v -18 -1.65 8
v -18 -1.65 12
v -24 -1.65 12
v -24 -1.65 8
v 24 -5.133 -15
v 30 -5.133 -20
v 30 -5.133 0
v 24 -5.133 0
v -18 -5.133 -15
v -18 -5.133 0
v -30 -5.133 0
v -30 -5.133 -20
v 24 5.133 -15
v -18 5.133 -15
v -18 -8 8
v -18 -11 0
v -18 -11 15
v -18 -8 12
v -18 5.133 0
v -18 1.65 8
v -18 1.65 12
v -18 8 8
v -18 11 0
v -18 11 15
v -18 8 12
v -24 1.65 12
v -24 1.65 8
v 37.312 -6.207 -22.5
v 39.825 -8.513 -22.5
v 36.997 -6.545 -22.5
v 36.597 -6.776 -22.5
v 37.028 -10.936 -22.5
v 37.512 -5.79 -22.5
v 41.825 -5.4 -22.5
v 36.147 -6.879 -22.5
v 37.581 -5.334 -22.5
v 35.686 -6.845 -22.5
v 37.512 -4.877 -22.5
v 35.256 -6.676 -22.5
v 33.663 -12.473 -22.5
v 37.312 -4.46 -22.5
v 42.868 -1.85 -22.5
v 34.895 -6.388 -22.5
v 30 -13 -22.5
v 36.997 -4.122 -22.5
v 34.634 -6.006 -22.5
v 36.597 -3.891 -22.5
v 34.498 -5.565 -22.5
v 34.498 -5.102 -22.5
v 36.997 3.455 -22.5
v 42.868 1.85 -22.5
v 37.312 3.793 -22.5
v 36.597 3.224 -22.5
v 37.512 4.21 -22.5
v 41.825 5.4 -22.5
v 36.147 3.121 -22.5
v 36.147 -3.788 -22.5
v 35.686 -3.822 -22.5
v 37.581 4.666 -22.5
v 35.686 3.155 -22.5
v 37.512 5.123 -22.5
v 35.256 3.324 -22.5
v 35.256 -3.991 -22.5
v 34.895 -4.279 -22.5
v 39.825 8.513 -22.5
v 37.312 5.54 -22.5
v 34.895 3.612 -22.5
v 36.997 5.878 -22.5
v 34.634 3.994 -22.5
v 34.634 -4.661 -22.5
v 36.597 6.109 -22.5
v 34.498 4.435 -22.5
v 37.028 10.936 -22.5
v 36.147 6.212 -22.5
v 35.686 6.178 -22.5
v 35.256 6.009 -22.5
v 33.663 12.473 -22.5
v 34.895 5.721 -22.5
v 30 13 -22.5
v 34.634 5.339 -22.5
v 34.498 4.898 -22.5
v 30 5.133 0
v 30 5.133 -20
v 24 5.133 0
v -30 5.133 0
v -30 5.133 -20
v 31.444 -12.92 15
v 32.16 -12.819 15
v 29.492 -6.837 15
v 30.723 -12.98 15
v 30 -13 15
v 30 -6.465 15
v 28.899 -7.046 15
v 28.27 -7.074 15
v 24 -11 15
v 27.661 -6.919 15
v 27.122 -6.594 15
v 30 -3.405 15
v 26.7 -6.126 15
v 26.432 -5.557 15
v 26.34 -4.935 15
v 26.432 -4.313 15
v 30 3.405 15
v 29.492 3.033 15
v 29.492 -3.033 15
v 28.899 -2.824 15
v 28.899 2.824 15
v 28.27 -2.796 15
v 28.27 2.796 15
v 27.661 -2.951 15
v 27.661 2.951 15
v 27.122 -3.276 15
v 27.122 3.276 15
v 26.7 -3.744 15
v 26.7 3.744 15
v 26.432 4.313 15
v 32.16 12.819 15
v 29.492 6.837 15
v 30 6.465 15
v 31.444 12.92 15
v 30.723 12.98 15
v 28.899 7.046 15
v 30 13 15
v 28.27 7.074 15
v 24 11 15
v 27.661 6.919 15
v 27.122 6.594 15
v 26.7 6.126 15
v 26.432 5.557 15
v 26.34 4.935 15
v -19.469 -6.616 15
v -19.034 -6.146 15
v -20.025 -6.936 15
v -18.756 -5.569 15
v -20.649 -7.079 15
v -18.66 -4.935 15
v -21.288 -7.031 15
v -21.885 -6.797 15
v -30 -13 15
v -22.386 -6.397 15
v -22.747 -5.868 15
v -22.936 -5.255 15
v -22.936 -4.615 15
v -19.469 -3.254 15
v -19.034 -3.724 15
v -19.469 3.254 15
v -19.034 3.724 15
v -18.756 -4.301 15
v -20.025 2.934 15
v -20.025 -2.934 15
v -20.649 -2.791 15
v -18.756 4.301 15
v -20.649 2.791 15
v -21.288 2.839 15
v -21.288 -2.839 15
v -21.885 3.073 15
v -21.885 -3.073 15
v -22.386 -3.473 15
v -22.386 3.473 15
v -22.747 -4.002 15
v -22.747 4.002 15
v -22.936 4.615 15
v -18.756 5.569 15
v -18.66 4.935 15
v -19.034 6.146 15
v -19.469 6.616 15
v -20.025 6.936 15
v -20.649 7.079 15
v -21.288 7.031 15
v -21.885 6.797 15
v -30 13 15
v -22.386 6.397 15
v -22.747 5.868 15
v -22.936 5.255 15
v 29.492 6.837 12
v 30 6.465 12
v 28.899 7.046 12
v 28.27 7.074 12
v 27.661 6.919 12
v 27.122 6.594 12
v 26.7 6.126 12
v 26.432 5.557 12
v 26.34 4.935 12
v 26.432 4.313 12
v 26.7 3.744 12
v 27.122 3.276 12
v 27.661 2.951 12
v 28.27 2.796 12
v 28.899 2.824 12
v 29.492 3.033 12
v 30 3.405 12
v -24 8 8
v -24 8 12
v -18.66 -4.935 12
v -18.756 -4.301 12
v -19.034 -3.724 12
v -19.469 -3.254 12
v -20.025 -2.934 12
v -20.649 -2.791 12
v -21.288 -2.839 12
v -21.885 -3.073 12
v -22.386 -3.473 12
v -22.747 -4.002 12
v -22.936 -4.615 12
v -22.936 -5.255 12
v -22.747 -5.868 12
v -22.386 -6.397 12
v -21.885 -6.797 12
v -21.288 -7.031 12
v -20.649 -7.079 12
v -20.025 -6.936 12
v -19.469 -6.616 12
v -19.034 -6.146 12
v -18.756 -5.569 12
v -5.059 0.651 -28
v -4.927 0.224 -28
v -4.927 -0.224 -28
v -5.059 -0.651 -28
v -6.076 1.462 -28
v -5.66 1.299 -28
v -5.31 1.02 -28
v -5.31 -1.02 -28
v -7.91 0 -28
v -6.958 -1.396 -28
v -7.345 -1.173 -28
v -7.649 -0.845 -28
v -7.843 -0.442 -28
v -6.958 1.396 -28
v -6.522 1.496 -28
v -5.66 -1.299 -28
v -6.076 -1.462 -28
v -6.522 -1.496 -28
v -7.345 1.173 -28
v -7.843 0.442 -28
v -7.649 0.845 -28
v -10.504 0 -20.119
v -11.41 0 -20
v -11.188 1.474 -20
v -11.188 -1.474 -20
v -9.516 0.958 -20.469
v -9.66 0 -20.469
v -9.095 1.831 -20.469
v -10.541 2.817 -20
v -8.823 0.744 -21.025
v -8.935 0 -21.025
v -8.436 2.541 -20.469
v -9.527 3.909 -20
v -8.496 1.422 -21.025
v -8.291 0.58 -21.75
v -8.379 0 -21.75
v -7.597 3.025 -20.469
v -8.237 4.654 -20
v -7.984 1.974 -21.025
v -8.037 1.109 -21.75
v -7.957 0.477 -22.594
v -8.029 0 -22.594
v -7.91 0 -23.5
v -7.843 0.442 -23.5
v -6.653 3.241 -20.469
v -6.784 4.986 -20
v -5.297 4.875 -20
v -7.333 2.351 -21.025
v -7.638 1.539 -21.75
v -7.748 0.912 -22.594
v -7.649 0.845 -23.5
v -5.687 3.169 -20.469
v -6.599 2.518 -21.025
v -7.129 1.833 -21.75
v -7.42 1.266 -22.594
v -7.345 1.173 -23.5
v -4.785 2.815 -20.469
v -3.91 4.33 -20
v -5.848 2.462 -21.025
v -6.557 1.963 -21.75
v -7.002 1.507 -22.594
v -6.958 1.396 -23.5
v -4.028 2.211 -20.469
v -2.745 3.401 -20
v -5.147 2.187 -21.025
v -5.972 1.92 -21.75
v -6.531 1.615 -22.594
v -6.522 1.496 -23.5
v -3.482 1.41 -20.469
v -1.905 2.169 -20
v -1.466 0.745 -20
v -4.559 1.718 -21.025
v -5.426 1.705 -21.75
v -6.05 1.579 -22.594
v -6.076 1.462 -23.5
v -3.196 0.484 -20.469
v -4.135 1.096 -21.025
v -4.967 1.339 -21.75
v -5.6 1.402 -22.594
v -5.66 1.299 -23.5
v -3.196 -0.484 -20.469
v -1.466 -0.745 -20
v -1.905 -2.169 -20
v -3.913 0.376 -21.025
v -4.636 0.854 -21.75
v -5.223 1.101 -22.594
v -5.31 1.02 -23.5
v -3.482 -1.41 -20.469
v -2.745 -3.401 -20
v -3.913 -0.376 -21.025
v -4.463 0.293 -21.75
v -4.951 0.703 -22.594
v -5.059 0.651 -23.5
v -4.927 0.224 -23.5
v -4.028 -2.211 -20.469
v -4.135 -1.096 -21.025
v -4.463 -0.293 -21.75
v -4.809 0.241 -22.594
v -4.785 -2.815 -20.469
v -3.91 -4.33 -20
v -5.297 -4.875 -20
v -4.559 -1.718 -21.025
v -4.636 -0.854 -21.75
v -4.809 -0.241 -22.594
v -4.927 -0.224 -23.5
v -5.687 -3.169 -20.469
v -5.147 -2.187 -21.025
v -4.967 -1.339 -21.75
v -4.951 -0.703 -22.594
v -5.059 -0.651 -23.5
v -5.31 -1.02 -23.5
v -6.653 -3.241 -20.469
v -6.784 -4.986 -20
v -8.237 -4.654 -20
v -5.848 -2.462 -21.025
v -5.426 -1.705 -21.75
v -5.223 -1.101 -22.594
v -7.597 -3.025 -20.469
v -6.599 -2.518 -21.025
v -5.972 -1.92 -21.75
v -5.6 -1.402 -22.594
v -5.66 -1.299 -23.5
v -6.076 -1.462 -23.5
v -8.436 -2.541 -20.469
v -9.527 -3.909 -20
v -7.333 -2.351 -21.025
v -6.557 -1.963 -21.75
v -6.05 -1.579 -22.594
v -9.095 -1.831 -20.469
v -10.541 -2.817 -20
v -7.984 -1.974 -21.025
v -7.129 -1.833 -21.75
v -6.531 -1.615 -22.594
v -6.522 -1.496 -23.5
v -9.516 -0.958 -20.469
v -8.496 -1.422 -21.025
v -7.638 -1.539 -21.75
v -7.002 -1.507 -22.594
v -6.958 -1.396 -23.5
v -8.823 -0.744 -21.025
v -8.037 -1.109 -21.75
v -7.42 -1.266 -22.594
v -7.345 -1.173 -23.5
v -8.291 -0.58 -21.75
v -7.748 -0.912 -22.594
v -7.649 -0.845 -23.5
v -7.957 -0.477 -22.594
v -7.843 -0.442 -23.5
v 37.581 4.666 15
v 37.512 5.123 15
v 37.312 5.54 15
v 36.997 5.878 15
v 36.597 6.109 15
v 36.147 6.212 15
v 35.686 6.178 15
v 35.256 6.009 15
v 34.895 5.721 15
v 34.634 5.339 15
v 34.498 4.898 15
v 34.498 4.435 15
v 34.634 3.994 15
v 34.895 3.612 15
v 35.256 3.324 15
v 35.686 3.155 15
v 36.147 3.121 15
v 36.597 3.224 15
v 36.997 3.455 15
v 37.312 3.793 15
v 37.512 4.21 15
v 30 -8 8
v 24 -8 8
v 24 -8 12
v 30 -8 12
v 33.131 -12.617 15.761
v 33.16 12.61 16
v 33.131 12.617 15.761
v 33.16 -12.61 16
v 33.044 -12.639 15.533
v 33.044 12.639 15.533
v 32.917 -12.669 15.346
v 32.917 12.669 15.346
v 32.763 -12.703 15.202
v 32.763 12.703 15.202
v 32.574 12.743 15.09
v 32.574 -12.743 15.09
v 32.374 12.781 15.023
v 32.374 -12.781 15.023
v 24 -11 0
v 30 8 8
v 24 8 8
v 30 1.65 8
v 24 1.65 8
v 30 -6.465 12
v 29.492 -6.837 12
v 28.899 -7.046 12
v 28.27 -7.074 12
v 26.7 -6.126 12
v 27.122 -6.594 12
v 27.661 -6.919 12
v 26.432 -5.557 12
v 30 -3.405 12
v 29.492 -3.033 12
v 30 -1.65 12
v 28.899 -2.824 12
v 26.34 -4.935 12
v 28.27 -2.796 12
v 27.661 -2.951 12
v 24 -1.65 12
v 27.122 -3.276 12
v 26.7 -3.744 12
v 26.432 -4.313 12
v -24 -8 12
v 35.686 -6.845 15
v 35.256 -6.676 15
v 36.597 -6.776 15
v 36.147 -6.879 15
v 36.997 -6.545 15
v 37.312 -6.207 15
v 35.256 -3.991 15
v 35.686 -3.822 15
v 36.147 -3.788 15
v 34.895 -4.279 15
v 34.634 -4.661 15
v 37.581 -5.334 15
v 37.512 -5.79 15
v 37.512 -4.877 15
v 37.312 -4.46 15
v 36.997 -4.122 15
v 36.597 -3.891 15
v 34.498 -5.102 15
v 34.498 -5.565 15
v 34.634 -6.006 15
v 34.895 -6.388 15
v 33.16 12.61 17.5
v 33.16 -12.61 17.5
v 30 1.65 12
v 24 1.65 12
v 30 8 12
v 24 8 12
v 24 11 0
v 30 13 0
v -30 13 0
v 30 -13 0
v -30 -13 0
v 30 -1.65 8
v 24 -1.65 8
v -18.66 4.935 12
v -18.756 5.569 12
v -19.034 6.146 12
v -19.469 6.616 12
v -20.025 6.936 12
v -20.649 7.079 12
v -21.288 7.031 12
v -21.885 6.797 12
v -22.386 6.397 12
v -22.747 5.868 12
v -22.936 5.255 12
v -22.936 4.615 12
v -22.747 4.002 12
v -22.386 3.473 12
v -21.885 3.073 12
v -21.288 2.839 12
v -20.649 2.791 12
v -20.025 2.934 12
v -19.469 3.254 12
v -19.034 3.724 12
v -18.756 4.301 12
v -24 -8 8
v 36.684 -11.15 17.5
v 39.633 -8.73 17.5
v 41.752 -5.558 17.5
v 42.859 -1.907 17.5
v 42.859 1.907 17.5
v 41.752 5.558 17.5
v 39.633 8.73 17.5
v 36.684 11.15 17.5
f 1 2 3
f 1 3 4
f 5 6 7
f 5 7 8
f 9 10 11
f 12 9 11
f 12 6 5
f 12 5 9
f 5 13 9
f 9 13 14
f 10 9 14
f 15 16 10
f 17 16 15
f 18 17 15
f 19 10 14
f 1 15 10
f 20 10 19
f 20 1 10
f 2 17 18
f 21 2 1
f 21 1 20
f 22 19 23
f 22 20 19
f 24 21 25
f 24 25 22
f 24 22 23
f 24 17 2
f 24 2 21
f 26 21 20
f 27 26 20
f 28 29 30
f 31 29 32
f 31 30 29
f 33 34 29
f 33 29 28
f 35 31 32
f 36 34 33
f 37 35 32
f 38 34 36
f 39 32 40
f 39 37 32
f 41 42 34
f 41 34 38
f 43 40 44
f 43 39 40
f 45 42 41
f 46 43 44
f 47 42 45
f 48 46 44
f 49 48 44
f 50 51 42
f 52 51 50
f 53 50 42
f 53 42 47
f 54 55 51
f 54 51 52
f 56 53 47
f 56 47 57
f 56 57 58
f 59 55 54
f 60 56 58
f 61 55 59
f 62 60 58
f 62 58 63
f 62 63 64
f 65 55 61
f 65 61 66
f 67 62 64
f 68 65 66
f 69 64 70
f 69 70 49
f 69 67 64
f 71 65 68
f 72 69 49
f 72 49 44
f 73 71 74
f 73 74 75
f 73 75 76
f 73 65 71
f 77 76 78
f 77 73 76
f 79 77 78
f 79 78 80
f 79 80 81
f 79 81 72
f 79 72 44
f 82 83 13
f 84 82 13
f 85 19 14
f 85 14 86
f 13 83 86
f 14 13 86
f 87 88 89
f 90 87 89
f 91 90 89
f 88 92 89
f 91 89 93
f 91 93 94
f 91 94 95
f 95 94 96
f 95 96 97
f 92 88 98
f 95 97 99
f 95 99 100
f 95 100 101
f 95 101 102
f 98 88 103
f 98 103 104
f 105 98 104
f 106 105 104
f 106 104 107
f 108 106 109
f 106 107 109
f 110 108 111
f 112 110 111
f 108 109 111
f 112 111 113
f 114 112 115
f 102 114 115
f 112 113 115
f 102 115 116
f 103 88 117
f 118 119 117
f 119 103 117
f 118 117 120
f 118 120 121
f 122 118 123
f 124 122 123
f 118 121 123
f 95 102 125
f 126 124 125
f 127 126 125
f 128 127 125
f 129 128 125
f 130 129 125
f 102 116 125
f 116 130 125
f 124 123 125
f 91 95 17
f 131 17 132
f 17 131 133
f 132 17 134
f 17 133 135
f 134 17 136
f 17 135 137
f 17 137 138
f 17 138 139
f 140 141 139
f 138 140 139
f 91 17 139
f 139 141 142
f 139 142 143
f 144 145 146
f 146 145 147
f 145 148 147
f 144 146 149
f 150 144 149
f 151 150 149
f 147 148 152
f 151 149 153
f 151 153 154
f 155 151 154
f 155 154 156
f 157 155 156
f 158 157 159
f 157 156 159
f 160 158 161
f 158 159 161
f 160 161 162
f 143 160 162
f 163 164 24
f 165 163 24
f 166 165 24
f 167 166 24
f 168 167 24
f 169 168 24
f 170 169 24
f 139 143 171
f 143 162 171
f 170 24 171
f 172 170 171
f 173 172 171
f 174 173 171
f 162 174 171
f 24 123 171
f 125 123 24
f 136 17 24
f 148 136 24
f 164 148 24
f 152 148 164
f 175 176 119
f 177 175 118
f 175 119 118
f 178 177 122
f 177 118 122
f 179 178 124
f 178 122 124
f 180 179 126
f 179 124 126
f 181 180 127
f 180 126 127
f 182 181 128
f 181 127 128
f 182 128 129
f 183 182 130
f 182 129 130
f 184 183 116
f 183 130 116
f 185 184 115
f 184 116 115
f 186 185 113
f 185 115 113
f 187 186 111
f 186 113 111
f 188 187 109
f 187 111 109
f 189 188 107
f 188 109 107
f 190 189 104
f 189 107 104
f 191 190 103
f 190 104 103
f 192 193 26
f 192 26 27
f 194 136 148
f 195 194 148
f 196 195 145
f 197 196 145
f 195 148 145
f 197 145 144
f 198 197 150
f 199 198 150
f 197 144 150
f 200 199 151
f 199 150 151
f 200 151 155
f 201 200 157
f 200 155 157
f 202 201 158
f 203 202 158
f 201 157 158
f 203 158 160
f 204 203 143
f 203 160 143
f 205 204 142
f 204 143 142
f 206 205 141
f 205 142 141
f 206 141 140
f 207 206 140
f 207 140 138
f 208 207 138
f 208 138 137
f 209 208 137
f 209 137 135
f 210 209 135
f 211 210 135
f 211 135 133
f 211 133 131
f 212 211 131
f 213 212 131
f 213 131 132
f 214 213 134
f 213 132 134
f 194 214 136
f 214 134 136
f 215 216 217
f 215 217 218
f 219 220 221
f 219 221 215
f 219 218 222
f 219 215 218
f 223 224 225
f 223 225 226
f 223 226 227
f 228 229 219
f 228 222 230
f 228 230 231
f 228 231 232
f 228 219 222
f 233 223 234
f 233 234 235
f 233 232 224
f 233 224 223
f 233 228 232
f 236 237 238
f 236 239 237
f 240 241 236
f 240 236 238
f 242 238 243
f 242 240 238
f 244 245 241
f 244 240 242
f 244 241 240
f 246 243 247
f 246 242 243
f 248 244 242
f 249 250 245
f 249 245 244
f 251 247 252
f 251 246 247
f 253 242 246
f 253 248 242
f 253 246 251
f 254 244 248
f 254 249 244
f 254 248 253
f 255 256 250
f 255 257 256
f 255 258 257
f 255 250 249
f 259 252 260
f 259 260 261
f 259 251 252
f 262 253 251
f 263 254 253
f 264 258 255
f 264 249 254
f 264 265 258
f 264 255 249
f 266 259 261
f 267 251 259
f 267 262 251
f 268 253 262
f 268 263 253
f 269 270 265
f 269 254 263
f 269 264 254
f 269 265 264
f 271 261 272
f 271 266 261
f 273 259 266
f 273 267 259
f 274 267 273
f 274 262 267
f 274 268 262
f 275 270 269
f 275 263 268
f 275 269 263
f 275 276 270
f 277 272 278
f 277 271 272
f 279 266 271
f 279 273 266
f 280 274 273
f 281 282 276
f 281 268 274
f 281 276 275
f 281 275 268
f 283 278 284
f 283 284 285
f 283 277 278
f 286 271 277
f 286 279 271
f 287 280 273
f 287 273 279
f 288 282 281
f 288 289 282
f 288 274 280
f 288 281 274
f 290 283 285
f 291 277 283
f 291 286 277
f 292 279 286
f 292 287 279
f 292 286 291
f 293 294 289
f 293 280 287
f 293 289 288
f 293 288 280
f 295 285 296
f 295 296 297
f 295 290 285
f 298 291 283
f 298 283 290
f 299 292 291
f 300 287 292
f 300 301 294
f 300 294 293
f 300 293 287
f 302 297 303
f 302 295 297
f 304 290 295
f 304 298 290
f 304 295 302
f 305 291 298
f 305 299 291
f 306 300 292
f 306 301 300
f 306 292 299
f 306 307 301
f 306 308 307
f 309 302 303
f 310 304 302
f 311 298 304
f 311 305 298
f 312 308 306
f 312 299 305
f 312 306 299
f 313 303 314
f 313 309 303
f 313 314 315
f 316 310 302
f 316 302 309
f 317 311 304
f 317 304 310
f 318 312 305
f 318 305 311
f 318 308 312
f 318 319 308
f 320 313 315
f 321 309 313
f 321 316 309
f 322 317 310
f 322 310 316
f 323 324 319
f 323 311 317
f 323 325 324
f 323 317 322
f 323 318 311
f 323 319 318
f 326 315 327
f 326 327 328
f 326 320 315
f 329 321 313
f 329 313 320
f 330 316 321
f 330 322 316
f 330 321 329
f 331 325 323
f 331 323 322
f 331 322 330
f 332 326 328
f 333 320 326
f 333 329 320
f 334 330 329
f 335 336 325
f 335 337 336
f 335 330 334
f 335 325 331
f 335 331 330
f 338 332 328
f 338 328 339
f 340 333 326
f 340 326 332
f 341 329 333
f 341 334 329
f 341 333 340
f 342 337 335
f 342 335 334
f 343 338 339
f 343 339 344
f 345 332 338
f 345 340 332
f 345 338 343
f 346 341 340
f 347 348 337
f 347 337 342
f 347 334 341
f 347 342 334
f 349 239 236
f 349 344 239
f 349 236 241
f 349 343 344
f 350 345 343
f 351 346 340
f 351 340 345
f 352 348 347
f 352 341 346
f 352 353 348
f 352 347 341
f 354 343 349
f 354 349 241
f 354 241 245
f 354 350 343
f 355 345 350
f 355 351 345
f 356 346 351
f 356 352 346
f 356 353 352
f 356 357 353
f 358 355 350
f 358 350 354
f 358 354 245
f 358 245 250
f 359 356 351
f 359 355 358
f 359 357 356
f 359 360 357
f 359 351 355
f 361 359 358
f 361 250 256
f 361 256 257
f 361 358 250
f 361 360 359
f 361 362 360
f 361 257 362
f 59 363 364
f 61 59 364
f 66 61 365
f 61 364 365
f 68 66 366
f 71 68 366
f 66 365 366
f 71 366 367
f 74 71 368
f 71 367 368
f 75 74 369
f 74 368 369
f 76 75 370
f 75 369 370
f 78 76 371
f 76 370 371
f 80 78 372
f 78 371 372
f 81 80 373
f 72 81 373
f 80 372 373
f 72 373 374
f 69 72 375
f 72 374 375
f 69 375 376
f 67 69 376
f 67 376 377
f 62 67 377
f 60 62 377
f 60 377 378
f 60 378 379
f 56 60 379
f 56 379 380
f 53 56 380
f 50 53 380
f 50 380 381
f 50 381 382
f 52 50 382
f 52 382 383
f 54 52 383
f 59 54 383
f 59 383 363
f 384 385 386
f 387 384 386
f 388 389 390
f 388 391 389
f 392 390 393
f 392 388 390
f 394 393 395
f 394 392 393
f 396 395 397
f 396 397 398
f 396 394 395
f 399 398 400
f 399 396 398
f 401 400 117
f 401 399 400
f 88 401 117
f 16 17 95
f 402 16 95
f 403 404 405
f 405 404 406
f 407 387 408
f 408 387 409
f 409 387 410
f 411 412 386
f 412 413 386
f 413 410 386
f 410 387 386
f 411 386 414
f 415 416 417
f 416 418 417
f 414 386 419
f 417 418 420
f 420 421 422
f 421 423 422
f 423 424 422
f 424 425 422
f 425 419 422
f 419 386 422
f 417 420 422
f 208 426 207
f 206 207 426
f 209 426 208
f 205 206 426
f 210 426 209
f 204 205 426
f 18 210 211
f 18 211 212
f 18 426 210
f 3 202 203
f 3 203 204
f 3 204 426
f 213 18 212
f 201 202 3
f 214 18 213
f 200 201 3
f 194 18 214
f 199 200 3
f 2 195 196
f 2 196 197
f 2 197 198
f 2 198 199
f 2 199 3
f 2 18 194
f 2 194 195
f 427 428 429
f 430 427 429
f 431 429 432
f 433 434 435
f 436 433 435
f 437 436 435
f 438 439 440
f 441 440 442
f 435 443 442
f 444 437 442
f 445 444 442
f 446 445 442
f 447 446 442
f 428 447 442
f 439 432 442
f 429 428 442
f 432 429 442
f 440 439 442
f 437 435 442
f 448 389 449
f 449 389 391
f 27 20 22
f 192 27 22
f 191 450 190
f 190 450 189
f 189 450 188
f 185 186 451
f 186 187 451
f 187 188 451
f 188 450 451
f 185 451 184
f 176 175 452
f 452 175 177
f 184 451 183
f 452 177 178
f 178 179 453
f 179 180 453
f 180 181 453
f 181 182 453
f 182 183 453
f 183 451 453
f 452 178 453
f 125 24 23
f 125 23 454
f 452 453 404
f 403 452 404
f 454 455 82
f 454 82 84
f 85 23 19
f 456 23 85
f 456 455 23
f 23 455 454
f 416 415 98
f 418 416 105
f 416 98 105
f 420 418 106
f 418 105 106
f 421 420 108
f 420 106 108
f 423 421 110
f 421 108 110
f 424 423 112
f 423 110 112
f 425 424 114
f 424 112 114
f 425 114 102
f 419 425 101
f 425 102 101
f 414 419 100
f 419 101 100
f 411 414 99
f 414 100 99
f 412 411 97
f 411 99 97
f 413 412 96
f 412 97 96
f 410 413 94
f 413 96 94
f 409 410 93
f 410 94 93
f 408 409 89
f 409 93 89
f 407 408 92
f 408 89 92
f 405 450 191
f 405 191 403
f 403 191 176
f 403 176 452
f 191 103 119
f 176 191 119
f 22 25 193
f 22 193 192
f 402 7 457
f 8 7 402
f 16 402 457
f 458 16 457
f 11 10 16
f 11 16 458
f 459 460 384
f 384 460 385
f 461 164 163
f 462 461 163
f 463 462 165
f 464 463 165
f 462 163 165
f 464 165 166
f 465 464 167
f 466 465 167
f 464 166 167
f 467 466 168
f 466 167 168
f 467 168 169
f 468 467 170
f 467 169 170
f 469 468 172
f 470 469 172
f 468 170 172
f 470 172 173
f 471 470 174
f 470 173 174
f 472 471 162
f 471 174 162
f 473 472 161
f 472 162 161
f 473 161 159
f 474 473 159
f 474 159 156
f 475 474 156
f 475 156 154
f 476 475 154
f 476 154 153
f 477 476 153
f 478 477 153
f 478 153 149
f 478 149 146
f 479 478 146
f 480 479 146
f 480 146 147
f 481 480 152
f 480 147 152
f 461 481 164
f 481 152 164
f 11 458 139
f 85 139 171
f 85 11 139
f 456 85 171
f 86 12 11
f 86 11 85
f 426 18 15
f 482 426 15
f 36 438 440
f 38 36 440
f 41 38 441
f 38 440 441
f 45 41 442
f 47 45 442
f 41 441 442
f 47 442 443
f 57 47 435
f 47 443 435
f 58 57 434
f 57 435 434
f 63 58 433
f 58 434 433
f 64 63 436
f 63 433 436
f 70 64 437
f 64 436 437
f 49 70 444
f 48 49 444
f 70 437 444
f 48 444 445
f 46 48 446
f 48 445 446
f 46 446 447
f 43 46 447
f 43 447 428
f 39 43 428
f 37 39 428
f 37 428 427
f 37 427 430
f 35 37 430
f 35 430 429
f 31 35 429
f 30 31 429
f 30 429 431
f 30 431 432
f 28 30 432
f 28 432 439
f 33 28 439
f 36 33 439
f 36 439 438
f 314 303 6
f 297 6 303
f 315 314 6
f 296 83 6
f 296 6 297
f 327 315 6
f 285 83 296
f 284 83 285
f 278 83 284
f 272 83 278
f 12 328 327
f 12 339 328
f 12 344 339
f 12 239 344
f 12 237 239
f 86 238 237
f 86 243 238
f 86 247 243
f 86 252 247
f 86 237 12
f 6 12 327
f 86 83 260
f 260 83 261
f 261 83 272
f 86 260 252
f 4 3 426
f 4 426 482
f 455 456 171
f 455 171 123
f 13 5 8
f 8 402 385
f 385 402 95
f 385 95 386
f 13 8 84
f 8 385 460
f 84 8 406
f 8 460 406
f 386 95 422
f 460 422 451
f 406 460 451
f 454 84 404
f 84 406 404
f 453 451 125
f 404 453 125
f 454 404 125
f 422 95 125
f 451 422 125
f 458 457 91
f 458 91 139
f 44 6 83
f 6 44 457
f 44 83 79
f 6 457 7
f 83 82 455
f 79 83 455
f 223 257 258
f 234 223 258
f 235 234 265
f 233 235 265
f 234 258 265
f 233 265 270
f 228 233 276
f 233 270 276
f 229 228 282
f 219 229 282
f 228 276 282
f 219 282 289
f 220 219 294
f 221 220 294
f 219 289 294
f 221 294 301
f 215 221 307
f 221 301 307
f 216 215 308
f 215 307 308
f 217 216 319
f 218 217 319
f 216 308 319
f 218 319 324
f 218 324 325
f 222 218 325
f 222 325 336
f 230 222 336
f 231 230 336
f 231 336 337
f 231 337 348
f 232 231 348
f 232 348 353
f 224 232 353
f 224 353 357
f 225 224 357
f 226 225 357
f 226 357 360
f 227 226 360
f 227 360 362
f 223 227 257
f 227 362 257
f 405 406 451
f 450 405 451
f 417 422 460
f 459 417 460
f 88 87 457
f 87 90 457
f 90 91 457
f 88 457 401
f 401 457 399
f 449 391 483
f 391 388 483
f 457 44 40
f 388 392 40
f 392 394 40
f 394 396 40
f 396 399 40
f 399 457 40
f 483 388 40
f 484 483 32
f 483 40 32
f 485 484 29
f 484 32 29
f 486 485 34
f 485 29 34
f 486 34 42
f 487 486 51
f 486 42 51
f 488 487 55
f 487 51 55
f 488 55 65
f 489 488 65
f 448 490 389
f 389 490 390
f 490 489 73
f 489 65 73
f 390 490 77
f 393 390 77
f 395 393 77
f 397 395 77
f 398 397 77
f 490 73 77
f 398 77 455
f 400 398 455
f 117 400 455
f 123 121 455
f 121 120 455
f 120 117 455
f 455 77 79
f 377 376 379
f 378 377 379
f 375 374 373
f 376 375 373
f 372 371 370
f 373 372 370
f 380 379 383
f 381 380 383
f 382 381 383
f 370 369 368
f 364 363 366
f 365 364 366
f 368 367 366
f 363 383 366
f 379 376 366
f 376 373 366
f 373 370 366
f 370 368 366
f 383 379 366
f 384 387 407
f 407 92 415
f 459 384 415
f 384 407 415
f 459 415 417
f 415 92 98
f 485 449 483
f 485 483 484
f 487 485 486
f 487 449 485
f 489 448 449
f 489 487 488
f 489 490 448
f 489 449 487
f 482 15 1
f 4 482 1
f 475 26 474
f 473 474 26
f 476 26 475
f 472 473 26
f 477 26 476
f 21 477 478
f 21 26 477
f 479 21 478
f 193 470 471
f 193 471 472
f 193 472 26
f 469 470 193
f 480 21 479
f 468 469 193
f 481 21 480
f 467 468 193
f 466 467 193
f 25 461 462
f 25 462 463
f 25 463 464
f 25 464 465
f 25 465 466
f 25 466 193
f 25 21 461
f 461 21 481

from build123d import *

# Parameters (mm, degrees)
BOSS_EXTRU_1_DEPTH      = 15
ESQUISSE2_W             = 42
ESQUISSE2_H             = 22
ENL_V_MAT_EXTRU_1_DEPTH = 48.36032094485848
ESQUISSE4_R             = 2.1499999999999972
ESQUISSE4_R_2           = 2.1499999999999977
ESQUISSE4_R_3           = 2.1500000000000012
ENL_V_MAT_EXTRU_2_DEPTH = 3
ESQUISSE5_W             = 4
ESQUISSE5_H             = 6.35
ENL_V_MAT_EXTRU_3_DEPTH = 6
ENL_V_MAT_EXTRU_4_DEPTH = 8
BOSS_EXTRU_6_START      = 20
ESQUISSE10_W            = 12.000000000000007
ESQUISSE10_H            = 10.265502917405067
BOSS_EXTRU_6_DEPTH      = 20
ESQUISSE11_W            = 42
ESQUISSE11_H            = 10.265502917405069
BOSS_EXTRU_7_DEPTH      = 5
BOSS_EXTRU_8_DEPTH      = 2.5
BOSS_EXTRU_8_DEPTH_BACK = 35
ESQUISSE13_R            = 1.5500000000000012
ENL_V_MAT_EXTRU_5_DEPTH = 59.51709152034131
BOSS_EXTRU_9_DEPTH      = 2.5
CONG_1_R                = 1
ESQUISSE15_R            = 1.4999999999999987
BOSS_EXTRU_10_DEPTH     = 8
CONG_2_R                = 3.5


with BuildPart() as part:
    # Esquisse1 → Boss.-Extru.1 (new body)
    with BuildSketch(Plane.XY):
        with BuildLine():
            Line((30, -12.999999999999996), (-30, -13.000000000000004))
            Line((-30, -13.000000000000004), (-30, 12.999999999999996))
            Line((-30, 12.999999999999996), (30, 13.000000000000004))
            ThreePointArc((30, 13.000000000000004), (43.00000000000001, 3.47e-15), (30, -12.999999999999996))
        make_face()
    extrude(amount=BOSS_EXTRU_1_DEPTH)

    # Esquisse2 → Enlèv. mat.-Extru.1 (cut, through all)
    with BuildSketch(Plane.XY.offset(15)):
        with Locations((3.0000000000000053, 0)):
            Rectangle(ESQUISSE2_W, ESQUISSE2_H)
    extrude(amount=-ENL_V_MAT_EXTRU_1_DEPTH, mode=Mode.SUBTRACT)

    # Esquisse4 → Enlèv. mat.-Extru.2 (cut)
    with BuildSketch(Plane.XY.offset(15)):
        with Locations((-20.809999999999974, 4.934999999999995)):
            Circle(ESQUISSE4_R)
        with Locations((-20.809999999999974, -4.935000000000005)):
            Circle(ESQUISSE4_R_2)
        with Locations((28.490000000000016, 4.934999999999976)):
            Circle(ESQUISSE4_R_3)
        with Locations((28.490000000000016, -4.93499999999999)):
            Circle(ESQUISSE4_R_3)
    extrude(amount=-ENL_V_MAT_EXTRU_2_DEPTH, mode=Mode.SUBTRACT)

    # Esquisse5 → Enlèv. mat.-Extru.3 (cut)
    with BuildSketch(Plane(origin=(-17.999999999999996, 0, 0), x_dir=(0, 0, -1), z_dir=(1, 0, 0))):
        with Locations((-10, -4.825)):
            Rectangle(ESQUISSE5_W, ESQUISSE5_H)
        with Locations((-10, 4.825)):
            Rectangle(ESQUISSE5_W, ESQUISSE5_H)
    extrude(amount=-ENL_V_MAT_EXTRU_3_DEPTH, mode=Mode.SUBTRACT)

    # Esquisse6 → Enlèv. mat.-Extru.4 (cut)
    with BuildSketch(Plane.ZY.offset(-24.000000000000007)):
        Polygon((12, 8), (8, 8), (8, 1.65), (12, 1.6500000000000004), align=None)
        Polygon((12, -1.6500000000000004), (8, -1.65), (8, -8), (12, -8), align=None)
    extrude(amount=-ENL_V_MAT_EXTRU_4_DEPTH, mode=Mode.SUBTRACT)

    # Esquisse10 → Boss.-Extru.6 (add)
    with BuildSketch(Plane(origin=(0, 0, 0), x_dir=(-1, 0, 0), z_dir=(0, 0, -1)).offset(BOSS_EXTRU_6_START)):
        with Locations((24, 0)):
            Rectangle(ESQUISSE10_W, ESQUISSE10_H)
        with BuildLine():
            Line((-24.000000000000007, 5.1327514587025345), (-41.94382109976481, 5.132751458702534))
            ThreePointArc((-41.94382109976481, 5.132751458702534), (-43, -7.1e-16), (-41.94382109976481, -5.132751458702534))
            Line((-41.94382109976481, -5.132751458702534), (-24.000000000000007, -5.132751458702534))
            Line((-24.000000000000007, -5.132751458702534), (-24.000000000000007, 5.1327514587025345))
        make_face()
    extrude(amount=-BOSS_EXTRU_6_DEPTH)

    # Esquisse11 → Boss.-Extru.7 (add)
    with BuildSketch(Plane(origin=(0, 0, -20), x_dir=(-1, 0, 0), z_dir=(0, 0, -1))):
        with Locations((-3.0000000000000053, 4.4e-16)):
            Rectangle(ESQUISSE11_W, ESQUISSE11_H)
    extrude(amount=-BOSS_EXTRU_7_DEPTH)

    # Esquisse12 → Boss.-Extru.8 (add, two sides: drawn at the far end of the back side and taken through both)
    with BuildSketch(Plane(origin=(0, 0, -20), x_dir=(-1, 0, 0), z_dir=(0, 0, -1)).offset(-BOSS_EXTRU_8_DEPTH_BACK)):
        with BuildLine():
            Line((-29.999999999999993, -12.999999999999996), (-30, 13.000000000000004))
            ThreePointArc((-30, 13.000000000000004), (-37.151021991186546, 10.8564674034221), (-41.94382109976481, 5.132751458702534))
            ThreePointArc((-41.94382109976481, 5.132751458702534), (-43, 5.06e-15), (-41.94382109976481, -5.132751458702532))
            ThreePointArc((-41.94382109976481, -5.132751458702532), (-37.15102199118654, -10.856467403422094), (-29.999999999999993, -12.999999999999996))
        make_face()
    extrude(amount=BOSS_EXTRU_8_DEPTH + BOSS_EXTRU_8_DEPTH_BACK)

    # Esquisse13 → Enlèv. mat.-Extru.5 (cut, through all)
    with BuildSketch(Plane.XY.offset(15)):
        with Locations((36.030874159306855, 4.6664949567902845)):
            Circle(ESQUISSE13_R)
        with Locations((36.030874159306855, -5.3335050432097155)):
            Circle(ESQUISSE13_R)
    extrude(amount=-ENL_V_MAT_EXTRU_5_DEPTH, mode=Mode.SUBTRACT)

    # Esquisse14 → Boss.-Extru.9 (add)
    with BuildSketch(Plane.XY.offset(15)):
        with BuildLine():
            Line((33.160130873307615, 12.610058400482057), (33.160130873307615, -12.610058400482053))
            ThreePointArc((33.160130873307615, -12.610058400482053), (43.00000000000001, 3.47e-15), (33.160130873307615, 12.610058400482057))
        make_face()
    extrude(amount=BOSS_EXTRU_9_DEPTH)

    # Congé1
    cong_1_edges = [part.edges().sort_by_distance(p)[0] for p in [
        (33.160130873307615, 1.78e-15, 15),
    ]]
    fillet(cong_1_edges, radius=CONG_1_R)

    # Esquisse15 → Boss.-Extru.10 (add)
    with BuildSketch(Plane(origin=(0, 0, -20), x_dir=(-1, 0, 0), z_dir=(0, 0, -1))):
        with Locations((6.410000000000011, 6.006e-14)):
            Circle(ESQUISSE15_R)
    extrude(amount=BOSS_EXTRU_10_DEPTH)

    # Congé2
    cong_2_edges = [part.edges().sort_by_distance(p)[0] for p in [
        (-4.910000000000013, 6.024e-14, -20),
    ]]
    fillet(cong_2_edges, radius=CONG_2_R)


solid = part.part
